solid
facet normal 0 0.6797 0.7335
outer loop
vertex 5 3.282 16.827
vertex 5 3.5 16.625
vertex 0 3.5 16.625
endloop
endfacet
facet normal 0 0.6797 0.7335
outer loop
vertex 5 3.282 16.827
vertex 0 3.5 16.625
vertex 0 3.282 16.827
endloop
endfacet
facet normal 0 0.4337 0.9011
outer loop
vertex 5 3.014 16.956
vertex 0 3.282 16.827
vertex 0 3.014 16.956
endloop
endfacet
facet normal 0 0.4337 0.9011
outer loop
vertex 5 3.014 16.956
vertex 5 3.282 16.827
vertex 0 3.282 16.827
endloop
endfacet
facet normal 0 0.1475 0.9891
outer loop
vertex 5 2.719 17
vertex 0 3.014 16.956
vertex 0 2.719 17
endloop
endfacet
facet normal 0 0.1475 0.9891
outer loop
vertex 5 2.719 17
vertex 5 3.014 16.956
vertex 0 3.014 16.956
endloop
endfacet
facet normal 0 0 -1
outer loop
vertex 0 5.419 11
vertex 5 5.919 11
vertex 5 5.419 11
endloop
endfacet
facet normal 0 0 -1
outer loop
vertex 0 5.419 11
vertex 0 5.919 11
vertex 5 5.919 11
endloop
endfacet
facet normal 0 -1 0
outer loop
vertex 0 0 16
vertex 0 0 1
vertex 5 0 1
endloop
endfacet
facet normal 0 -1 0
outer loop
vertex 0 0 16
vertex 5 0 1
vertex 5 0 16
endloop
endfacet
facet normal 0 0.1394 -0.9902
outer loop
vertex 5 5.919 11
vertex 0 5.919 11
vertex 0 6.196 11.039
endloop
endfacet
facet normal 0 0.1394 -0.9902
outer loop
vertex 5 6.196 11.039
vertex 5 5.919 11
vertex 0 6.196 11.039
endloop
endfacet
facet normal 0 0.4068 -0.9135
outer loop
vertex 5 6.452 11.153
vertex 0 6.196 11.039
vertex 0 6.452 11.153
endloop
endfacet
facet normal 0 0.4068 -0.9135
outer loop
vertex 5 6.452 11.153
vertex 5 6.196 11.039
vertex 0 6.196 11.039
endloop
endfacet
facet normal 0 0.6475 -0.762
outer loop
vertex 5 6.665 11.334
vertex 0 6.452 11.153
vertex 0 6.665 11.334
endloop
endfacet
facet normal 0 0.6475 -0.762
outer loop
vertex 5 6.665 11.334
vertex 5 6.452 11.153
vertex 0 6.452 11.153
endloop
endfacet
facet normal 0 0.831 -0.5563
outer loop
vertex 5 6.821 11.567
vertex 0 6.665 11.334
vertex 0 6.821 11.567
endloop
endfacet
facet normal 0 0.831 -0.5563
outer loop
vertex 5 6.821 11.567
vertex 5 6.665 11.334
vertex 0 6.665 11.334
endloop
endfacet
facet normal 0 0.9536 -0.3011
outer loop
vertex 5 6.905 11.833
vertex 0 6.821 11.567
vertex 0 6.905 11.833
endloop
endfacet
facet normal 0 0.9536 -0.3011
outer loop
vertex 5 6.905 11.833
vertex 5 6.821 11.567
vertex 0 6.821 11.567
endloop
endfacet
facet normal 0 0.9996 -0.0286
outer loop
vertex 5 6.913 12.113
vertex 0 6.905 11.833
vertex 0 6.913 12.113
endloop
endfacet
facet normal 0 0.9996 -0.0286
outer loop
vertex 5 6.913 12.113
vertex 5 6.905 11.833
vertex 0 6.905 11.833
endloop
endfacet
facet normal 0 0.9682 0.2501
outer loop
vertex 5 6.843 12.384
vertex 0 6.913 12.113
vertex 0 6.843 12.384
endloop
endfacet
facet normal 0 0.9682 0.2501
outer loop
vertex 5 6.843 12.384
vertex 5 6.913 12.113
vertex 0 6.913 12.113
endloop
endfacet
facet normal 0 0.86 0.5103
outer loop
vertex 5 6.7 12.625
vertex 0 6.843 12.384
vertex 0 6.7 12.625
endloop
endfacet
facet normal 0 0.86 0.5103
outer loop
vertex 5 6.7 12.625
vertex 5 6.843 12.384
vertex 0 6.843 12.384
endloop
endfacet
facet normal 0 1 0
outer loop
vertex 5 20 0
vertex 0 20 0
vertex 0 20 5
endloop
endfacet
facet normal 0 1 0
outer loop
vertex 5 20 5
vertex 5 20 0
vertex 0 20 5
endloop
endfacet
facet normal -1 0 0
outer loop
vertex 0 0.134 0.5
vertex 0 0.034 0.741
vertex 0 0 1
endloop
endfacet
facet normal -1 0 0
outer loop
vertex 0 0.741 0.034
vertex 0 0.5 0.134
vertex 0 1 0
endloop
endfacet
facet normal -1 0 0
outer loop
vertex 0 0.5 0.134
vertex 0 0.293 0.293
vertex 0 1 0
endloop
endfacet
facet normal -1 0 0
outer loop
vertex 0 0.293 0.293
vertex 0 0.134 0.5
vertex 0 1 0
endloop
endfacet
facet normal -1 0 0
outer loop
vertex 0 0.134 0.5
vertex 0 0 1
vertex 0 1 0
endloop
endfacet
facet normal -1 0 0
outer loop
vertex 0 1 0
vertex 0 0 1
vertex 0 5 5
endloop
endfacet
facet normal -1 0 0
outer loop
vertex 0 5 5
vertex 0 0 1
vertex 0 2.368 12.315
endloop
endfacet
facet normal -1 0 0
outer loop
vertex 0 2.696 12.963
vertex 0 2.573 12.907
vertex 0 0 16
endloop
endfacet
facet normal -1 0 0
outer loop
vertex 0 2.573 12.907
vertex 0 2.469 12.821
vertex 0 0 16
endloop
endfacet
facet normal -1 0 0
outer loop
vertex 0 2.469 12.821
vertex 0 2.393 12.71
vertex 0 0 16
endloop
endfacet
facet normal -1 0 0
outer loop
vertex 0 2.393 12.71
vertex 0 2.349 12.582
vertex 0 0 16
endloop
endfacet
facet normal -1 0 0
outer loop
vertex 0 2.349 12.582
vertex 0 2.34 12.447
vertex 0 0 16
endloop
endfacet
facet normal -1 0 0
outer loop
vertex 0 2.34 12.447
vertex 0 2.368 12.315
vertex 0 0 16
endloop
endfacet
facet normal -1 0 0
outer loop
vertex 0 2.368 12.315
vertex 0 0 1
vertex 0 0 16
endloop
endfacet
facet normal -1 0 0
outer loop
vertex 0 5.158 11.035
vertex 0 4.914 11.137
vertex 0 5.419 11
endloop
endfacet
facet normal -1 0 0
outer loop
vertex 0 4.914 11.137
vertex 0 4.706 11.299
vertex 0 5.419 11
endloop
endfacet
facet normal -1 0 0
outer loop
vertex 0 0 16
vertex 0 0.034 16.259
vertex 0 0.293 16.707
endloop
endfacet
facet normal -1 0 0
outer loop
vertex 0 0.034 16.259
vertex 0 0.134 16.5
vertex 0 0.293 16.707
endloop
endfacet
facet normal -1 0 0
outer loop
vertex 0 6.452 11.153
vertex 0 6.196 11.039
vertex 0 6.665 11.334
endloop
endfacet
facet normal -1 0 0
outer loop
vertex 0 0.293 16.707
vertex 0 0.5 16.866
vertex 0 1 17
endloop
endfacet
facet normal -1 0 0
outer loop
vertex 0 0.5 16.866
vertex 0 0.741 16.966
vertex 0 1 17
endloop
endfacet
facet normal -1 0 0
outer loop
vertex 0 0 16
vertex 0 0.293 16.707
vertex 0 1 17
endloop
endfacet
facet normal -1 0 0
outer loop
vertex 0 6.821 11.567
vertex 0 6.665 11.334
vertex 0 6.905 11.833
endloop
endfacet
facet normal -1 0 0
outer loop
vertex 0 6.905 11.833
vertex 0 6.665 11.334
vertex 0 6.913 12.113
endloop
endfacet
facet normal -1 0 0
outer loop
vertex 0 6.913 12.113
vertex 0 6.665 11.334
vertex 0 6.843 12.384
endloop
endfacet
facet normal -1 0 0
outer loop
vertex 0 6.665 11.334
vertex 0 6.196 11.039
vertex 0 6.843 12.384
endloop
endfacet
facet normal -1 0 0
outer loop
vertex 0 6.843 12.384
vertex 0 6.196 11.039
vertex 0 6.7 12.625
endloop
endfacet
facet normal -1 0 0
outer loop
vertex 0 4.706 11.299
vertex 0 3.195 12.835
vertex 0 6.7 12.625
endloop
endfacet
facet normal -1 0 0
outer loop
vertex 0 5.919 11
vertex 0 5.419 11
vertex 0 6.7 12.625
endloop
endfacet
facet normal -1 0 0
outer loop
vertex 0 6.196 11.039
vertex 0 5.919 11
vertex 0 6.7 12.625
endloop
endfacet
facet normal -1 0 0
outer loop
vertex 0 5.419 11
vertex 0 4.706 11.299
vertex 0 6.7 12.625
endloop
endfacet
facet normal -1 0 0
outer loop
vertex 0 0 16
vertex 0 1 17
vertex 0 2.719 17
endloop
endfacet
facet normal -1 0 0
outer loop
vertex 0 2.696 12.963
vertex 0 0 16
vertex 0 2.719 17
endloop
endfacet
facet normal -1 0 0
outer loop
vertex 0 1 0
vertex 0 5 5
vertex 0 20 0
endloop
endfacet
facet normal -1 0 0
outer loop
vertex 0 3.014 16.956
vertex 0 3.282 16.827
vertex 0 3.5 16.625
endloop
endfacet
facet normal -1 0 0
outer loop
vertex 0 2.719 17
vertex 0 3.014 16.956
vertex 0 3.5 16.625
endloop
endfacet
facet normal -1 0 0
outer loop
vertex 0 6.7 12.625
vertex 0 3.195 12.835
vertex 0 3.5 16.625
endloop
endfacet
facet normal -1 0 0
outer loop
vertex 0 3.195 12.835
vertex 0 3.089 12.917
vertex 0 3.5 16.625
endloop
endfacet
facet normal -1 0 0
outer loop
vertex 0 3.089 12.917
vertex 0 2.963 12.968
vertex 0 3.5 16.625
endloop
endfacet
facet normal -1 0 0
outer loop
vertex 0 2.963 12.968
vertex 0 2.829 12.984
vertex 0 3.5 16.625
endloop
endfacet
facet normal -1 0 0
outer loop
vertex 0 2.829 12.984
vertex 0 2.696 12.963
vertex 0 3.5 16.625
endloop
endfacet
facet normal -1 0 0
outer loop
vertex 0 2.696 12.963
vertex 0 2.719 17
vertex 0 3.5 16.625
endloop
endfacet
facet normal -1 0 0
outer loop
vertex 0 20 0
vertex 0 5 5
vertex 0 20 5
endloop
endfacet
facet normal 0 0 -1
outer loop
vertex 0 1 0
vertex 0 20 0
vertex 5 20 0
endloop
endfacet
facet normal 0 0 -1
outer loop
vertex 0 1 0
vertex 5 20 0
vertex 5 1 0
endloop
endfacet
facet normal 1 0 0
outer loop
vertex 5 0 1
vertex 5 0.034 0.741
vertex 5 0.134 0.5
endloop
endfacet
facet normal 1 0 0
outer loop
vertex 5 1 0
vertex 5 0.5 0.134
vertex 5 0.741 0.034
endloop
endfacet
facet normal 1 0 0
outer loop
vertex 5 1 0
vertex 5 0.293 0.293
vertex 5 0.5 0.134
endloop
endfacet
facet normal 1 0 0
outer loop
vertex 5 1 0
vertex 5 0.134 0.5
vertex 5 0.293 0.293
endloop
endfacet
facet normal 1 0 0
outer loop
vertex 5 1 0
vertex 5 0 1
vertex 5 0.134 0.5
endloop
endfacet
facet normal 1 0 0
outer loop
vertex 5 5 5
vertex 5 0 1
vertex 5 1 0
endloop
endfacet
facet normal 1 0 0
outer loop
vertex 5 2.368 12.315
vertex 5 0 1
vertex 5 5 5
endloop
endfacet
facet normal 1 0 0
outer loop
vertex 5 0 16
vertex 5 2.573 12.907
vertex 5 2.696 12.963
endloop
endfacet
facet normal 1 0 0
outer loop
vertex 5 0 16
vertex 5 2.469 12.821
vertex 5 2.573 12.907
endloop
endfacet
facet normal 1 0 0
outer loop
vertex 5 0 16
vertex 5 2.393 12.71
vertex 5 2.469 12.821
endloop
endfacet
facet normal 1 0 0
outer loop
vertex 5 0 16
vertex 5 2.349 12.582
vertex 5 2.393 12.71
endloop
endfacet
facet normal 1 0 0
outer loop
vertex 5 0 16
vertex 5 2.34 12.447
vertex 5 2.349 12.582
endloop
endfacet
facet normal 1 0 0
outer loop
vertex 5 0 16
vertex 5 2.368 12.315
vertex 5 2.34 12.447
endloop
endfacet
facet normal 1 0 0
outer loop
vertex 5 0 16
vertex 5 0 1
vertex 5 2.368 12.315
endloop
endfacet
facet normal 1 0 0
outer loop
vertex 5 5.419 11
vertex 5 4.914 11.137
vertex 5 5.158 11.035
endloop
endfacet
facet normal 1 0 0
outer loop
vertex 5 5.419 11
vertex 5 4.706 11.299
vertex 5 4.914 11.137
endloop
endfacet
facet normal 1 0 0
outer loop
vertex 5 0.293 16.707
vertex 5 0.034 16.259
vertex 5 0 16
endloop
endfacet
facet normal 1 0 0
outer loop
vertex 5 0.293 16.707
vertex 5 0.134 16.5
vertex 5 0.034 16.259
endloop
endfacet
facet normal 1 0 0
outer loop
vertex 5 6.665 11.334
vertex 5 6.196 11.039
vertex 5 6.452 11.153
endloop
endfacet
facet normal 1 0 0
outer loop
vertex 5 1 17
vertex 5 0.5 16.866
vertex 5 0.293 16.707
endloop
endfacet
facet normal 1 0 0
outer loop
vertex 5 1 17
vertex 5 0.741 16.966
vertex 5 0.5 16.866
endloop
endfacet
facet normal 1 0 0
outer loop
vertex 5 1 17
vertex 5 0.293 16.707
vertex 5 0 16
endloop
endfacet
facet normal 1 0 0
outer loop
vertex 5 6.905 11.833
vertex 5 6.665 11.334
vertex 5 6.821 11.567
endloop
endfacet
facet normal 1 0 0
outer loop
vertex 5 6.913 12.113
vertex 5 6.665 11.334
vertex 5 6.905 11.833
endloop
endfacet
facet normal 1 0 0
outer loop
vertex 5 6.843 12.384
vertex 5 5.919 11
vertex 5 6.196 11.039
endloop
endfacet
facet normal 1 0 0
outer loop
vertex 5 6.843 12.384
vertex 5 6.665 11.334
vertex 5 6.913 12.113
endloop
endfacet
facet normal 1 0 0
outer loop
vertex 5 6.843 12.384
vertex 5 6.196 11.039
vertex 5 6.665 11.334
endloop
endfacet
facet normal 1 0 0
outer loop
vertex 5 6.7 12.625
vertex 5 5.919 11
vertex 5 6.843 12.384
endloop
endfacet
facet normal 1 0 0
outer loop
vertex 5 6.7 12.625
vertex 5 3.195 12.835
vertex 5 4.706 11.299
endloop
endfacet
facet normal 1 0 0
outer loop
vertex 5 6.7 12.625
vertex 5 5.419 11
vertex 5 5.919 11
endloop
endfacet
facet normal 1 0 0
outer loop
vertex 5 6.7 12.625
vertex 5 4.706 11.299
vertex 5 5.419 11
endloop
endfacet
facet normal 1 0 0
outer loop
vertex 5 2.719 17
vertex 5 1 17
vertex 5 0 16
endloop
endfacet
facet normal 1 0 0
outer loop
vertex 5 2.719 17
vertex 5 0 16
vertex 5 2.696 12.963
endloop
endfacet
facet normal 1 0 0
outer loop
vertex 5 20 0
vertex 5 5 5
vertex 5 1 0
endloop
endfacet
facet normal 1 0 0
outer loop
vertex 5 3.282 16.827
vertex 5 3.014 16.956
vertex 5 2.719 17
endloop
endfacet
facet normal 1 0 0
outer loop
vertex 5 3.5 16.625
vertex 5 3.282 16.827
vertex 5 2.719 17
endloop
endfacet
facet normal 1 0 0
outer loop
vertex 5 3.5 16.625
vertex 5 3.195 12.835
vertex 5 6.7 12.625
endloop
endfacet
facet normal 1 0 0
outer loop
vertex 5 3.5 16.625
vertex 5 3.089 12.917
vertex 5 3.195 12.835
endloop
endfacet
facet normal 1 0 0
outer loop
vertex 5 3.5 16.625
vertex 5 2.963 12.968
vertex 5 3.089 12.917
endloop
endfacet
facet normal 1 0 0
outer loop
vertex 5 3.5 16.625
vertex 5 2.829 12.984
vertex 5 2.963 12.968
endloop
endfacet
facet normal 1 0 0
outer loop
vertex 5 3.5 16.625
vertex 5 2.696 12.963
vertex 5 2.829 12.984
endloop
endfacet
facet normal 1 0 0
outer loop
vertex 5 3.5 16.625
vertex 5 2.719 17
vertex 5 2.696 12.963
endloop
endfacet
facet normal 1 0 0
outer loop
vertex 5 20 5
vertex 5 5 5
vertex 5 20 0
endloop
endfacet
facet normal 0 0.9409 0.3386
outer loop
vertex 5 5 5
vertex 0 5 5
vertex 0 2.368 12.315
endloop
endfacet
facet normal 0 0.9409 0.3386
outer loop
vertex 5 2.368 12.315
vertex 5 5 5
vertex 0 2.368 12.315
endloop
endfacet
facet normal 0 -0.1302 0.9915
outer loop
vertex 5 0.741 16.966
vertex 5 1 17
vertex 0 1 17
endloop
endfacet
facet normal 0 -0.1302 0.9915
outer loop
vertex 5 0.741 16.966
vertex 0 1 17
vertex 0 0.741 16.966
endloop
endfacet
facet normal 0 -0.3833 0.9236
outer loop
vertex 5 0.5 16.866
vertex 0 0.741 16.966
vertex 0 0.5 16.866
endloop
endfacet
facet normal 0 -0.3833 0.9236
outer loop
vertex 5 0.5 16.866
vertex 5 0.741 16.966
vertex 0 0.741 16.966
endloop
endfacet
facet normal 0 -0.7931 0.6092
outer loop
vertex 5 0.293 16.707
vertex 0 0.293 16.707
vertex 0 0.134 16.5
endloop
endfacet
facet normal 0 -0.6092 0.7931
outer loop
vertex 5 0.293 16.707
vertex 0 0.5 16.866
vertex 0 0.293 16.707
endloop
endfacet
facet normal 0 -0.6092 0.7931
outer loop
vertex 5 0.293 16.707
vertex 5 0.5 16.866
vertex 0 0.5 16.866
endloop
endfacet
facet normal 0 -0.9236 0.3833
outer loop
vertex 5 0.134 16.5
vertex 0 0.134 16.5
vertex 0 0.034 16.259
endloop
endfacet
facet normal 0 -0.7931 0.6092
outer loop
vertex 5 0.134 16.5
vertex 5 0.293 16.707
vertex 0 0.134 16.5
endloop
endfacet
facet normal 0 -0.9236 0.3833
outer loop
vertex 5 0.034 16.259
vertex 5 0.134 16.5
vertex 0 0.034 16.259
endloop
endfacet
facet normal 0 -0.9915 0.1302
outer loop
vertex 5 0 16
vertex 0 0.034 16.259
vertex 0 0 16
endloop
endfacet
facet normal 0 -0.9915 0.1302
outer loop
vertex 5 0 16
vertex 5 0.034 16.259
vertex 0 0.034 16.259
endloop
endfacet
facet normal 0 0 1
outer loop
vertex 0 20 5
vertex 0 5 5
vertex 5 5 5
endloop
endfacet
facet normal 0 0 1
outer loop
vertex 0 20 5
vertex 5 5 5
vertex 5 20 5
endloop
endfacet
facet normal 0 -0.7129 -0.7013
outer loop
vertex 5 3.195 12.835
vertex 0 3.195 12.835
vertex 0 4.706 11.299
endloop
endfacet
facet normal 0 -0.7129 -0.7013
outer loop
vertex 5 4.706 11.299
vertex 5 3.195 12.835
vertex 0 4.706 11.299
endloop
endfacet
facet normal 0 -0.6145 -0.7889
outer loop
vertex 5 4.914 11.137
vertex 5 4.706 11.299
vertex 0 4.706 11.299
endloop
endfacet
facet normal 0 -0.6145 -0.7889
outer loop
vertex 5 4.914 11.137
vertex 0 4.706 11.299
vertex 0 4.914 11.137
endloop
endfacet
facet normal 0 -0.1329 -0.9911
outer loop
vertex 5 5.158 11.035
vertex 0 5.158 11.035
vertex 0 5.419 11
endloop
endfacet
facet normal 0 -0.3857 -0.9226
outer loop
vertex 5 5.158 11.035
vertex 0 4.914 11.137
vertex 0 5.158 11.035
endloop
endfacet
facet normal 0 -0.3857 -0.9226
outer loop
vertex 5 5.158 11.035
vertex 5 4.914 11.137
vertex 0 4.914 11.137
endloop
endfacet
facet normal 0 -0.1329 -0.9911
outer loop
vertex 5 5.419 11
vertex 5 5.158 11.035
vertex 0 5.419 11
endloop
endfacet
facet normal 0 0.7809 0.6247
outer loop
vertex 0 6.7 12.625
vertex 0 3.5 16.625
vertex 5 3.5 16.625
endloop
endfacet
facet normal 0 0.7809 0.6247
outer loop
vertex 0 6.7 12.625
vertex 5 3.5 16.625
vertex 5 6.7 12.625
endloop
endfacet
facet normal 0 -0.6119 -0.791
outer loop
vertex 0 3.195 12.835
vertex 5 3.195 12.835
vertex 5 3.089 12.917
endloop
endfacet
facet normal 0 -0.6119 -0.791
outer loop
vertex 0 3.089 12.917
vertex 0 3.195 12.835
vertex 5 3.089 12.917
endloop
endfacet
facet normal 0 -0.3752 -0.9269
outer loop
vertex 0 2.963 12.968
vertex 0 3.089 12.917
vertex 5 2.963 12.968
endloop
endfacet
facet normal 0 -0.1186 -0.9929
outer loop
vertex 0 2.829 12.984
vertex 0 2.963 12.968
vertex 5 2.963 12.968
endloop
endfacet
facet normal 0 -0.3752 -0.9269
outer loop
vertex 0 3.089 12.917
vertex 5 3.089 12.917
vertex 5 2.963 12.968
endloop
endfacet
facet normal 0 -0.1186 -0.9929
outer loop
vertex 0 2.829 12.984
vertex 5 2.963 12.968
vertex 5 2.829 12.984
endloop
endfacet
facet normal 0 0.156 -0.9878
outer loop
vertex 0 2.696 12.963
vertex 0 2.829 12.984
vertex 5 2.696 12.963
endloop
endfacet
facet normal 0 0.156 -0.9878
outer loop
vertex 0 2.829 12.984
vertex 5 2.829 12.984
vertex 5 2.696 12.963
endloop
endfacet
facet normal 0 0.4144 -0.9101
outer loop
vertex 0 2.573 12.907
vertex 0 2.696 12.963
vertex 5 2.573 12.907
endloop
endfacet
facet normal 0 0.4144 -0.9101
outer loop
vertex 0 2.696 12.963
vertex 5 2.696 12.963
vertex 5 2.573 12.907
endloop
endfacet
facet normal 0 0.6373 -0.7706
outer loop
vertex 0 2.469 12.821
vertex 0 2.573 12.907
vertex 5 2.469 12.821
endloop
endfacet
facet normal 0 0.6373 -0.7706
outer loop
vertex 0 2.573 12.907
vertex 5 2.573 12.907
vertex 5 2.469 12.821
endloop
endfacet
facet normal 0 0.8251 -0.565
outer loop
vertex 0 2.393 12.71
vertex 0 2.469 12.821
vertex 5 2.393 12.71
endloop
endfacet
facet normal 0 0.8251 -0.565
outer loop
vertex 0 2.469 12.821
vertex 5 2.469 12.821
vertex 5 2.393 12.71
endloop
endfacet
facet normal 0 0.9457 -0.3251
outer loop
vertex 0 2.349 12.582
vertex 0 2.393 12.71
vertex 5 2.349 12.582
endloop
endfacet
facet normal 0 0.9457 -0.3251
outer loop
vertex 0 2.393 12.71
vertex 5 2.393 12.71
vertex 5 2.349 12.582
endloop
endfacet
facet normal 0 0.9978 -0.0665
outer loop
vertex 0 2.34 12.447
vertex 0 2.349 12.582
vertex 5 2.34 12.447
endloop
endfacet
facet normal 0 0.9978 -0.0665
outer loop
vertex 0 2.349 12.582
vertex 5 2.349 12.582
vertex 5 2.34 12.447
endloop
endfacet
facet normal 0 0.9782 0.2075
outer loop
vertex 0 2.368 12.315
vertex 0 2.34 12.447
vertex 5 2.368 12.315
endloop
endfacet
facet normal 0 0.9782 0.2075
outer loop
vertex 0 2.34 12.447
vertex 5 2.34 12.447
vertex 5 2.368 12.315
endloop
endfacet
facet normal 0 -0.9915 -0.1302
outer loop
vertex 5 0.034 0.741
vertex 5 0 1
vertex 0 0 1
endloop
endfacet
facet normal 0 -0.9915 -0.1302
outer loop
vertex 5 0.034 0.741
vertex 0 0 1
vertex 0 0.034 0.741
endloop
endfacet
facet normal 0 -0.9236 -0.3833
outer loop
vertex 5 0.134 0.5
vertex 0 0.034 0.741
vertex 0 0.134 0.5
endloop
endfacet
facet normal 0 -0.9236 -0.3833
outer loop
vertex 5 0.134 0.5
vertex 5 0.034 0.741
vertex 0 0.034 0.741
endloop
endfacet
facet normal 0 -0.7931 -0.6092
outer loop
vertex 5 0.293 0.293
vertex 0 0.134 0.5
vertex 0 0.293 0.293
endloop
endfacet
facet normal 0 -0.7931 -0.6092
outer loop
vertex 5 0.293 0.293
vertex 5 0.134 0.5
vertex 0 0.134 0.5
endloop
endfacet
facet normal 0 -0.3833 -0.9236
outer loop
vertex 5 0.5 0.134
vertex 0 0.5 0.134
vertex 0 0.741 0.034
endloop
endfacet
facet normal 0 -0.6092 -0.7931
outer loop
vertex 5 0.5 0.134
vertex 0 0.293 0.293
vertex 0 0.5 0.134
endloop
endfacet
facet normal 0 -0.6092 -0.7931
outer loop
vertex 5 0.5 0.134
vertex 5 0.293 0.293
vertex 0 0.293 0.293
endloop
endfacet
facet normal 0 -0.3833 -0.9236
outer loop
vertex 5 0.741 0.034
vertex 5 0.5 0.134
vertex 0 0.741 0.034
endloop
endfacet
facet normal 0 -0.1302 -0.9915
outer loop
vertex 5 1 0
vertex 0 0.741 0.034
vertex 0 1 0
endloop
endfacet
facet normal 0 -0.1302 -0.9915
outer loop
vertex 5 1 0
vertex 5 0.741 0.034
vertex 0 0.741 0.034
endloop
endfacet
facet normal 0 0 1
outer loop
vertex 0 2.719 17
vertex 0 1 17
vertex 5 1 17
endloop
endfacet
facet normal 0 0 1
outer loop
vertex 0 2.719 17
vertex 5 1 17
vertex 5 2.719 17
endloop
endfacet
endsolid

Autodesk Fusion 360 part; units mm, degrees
sketch "Sketch1" plane through (0, 0, 0) normal (1, 0, 0) x (0, 1, 0)
  line L0 (3.2, 17) -> (8, 11)
  line L1 (8, 11) -> (5, 11)
  line L2 (0, 17) -> (3.2, 17)
  line L3 (5, 11) -> (5, 5) construction
  line L4 (0, 17) -> (5, 9.0465) construction
  line L5 (20, 0) -> (0, 0)
  line L6 (5, 5) -> (1.5967, 14.4602)
  line L7 (0, 0) -> (0, 21) construction
  line L8 (0, 21) -> (8, 11) construction
  line L9 (5, 5) -> (20, 5)
  line L10 (0, 0) -> (0, 17)
  line L11 (1.5967, 14.4602) -> (5, 11)
  line L12 (2.1849, 12.8252) -> (2.8151, 13.2214) construction
  line L13 (20, 0) -> (20, 5)
  dimension "d4" = 20
  dimension "d5" = 8
  dimension "d6" = 5
  dimension "d7" = 21
  dimension "d8" = 6
  dimension "d9" = 5
  dimension "d25" = 17
  dimension "d26" = 3
extrude "Extrude1" add sketch "Sketch1" along normal blind 5
fillet "Fillet1" radius 1 5 edges at (2.5, 3.2, 17) (2.5, 0, 17) (2.5, 0, 0) (2.5, 5, 11) (2.5, 8, 11)
fillet "Fillet2" radius 0.5 1 edges at (2.5, 1.5967, 14.4602)
